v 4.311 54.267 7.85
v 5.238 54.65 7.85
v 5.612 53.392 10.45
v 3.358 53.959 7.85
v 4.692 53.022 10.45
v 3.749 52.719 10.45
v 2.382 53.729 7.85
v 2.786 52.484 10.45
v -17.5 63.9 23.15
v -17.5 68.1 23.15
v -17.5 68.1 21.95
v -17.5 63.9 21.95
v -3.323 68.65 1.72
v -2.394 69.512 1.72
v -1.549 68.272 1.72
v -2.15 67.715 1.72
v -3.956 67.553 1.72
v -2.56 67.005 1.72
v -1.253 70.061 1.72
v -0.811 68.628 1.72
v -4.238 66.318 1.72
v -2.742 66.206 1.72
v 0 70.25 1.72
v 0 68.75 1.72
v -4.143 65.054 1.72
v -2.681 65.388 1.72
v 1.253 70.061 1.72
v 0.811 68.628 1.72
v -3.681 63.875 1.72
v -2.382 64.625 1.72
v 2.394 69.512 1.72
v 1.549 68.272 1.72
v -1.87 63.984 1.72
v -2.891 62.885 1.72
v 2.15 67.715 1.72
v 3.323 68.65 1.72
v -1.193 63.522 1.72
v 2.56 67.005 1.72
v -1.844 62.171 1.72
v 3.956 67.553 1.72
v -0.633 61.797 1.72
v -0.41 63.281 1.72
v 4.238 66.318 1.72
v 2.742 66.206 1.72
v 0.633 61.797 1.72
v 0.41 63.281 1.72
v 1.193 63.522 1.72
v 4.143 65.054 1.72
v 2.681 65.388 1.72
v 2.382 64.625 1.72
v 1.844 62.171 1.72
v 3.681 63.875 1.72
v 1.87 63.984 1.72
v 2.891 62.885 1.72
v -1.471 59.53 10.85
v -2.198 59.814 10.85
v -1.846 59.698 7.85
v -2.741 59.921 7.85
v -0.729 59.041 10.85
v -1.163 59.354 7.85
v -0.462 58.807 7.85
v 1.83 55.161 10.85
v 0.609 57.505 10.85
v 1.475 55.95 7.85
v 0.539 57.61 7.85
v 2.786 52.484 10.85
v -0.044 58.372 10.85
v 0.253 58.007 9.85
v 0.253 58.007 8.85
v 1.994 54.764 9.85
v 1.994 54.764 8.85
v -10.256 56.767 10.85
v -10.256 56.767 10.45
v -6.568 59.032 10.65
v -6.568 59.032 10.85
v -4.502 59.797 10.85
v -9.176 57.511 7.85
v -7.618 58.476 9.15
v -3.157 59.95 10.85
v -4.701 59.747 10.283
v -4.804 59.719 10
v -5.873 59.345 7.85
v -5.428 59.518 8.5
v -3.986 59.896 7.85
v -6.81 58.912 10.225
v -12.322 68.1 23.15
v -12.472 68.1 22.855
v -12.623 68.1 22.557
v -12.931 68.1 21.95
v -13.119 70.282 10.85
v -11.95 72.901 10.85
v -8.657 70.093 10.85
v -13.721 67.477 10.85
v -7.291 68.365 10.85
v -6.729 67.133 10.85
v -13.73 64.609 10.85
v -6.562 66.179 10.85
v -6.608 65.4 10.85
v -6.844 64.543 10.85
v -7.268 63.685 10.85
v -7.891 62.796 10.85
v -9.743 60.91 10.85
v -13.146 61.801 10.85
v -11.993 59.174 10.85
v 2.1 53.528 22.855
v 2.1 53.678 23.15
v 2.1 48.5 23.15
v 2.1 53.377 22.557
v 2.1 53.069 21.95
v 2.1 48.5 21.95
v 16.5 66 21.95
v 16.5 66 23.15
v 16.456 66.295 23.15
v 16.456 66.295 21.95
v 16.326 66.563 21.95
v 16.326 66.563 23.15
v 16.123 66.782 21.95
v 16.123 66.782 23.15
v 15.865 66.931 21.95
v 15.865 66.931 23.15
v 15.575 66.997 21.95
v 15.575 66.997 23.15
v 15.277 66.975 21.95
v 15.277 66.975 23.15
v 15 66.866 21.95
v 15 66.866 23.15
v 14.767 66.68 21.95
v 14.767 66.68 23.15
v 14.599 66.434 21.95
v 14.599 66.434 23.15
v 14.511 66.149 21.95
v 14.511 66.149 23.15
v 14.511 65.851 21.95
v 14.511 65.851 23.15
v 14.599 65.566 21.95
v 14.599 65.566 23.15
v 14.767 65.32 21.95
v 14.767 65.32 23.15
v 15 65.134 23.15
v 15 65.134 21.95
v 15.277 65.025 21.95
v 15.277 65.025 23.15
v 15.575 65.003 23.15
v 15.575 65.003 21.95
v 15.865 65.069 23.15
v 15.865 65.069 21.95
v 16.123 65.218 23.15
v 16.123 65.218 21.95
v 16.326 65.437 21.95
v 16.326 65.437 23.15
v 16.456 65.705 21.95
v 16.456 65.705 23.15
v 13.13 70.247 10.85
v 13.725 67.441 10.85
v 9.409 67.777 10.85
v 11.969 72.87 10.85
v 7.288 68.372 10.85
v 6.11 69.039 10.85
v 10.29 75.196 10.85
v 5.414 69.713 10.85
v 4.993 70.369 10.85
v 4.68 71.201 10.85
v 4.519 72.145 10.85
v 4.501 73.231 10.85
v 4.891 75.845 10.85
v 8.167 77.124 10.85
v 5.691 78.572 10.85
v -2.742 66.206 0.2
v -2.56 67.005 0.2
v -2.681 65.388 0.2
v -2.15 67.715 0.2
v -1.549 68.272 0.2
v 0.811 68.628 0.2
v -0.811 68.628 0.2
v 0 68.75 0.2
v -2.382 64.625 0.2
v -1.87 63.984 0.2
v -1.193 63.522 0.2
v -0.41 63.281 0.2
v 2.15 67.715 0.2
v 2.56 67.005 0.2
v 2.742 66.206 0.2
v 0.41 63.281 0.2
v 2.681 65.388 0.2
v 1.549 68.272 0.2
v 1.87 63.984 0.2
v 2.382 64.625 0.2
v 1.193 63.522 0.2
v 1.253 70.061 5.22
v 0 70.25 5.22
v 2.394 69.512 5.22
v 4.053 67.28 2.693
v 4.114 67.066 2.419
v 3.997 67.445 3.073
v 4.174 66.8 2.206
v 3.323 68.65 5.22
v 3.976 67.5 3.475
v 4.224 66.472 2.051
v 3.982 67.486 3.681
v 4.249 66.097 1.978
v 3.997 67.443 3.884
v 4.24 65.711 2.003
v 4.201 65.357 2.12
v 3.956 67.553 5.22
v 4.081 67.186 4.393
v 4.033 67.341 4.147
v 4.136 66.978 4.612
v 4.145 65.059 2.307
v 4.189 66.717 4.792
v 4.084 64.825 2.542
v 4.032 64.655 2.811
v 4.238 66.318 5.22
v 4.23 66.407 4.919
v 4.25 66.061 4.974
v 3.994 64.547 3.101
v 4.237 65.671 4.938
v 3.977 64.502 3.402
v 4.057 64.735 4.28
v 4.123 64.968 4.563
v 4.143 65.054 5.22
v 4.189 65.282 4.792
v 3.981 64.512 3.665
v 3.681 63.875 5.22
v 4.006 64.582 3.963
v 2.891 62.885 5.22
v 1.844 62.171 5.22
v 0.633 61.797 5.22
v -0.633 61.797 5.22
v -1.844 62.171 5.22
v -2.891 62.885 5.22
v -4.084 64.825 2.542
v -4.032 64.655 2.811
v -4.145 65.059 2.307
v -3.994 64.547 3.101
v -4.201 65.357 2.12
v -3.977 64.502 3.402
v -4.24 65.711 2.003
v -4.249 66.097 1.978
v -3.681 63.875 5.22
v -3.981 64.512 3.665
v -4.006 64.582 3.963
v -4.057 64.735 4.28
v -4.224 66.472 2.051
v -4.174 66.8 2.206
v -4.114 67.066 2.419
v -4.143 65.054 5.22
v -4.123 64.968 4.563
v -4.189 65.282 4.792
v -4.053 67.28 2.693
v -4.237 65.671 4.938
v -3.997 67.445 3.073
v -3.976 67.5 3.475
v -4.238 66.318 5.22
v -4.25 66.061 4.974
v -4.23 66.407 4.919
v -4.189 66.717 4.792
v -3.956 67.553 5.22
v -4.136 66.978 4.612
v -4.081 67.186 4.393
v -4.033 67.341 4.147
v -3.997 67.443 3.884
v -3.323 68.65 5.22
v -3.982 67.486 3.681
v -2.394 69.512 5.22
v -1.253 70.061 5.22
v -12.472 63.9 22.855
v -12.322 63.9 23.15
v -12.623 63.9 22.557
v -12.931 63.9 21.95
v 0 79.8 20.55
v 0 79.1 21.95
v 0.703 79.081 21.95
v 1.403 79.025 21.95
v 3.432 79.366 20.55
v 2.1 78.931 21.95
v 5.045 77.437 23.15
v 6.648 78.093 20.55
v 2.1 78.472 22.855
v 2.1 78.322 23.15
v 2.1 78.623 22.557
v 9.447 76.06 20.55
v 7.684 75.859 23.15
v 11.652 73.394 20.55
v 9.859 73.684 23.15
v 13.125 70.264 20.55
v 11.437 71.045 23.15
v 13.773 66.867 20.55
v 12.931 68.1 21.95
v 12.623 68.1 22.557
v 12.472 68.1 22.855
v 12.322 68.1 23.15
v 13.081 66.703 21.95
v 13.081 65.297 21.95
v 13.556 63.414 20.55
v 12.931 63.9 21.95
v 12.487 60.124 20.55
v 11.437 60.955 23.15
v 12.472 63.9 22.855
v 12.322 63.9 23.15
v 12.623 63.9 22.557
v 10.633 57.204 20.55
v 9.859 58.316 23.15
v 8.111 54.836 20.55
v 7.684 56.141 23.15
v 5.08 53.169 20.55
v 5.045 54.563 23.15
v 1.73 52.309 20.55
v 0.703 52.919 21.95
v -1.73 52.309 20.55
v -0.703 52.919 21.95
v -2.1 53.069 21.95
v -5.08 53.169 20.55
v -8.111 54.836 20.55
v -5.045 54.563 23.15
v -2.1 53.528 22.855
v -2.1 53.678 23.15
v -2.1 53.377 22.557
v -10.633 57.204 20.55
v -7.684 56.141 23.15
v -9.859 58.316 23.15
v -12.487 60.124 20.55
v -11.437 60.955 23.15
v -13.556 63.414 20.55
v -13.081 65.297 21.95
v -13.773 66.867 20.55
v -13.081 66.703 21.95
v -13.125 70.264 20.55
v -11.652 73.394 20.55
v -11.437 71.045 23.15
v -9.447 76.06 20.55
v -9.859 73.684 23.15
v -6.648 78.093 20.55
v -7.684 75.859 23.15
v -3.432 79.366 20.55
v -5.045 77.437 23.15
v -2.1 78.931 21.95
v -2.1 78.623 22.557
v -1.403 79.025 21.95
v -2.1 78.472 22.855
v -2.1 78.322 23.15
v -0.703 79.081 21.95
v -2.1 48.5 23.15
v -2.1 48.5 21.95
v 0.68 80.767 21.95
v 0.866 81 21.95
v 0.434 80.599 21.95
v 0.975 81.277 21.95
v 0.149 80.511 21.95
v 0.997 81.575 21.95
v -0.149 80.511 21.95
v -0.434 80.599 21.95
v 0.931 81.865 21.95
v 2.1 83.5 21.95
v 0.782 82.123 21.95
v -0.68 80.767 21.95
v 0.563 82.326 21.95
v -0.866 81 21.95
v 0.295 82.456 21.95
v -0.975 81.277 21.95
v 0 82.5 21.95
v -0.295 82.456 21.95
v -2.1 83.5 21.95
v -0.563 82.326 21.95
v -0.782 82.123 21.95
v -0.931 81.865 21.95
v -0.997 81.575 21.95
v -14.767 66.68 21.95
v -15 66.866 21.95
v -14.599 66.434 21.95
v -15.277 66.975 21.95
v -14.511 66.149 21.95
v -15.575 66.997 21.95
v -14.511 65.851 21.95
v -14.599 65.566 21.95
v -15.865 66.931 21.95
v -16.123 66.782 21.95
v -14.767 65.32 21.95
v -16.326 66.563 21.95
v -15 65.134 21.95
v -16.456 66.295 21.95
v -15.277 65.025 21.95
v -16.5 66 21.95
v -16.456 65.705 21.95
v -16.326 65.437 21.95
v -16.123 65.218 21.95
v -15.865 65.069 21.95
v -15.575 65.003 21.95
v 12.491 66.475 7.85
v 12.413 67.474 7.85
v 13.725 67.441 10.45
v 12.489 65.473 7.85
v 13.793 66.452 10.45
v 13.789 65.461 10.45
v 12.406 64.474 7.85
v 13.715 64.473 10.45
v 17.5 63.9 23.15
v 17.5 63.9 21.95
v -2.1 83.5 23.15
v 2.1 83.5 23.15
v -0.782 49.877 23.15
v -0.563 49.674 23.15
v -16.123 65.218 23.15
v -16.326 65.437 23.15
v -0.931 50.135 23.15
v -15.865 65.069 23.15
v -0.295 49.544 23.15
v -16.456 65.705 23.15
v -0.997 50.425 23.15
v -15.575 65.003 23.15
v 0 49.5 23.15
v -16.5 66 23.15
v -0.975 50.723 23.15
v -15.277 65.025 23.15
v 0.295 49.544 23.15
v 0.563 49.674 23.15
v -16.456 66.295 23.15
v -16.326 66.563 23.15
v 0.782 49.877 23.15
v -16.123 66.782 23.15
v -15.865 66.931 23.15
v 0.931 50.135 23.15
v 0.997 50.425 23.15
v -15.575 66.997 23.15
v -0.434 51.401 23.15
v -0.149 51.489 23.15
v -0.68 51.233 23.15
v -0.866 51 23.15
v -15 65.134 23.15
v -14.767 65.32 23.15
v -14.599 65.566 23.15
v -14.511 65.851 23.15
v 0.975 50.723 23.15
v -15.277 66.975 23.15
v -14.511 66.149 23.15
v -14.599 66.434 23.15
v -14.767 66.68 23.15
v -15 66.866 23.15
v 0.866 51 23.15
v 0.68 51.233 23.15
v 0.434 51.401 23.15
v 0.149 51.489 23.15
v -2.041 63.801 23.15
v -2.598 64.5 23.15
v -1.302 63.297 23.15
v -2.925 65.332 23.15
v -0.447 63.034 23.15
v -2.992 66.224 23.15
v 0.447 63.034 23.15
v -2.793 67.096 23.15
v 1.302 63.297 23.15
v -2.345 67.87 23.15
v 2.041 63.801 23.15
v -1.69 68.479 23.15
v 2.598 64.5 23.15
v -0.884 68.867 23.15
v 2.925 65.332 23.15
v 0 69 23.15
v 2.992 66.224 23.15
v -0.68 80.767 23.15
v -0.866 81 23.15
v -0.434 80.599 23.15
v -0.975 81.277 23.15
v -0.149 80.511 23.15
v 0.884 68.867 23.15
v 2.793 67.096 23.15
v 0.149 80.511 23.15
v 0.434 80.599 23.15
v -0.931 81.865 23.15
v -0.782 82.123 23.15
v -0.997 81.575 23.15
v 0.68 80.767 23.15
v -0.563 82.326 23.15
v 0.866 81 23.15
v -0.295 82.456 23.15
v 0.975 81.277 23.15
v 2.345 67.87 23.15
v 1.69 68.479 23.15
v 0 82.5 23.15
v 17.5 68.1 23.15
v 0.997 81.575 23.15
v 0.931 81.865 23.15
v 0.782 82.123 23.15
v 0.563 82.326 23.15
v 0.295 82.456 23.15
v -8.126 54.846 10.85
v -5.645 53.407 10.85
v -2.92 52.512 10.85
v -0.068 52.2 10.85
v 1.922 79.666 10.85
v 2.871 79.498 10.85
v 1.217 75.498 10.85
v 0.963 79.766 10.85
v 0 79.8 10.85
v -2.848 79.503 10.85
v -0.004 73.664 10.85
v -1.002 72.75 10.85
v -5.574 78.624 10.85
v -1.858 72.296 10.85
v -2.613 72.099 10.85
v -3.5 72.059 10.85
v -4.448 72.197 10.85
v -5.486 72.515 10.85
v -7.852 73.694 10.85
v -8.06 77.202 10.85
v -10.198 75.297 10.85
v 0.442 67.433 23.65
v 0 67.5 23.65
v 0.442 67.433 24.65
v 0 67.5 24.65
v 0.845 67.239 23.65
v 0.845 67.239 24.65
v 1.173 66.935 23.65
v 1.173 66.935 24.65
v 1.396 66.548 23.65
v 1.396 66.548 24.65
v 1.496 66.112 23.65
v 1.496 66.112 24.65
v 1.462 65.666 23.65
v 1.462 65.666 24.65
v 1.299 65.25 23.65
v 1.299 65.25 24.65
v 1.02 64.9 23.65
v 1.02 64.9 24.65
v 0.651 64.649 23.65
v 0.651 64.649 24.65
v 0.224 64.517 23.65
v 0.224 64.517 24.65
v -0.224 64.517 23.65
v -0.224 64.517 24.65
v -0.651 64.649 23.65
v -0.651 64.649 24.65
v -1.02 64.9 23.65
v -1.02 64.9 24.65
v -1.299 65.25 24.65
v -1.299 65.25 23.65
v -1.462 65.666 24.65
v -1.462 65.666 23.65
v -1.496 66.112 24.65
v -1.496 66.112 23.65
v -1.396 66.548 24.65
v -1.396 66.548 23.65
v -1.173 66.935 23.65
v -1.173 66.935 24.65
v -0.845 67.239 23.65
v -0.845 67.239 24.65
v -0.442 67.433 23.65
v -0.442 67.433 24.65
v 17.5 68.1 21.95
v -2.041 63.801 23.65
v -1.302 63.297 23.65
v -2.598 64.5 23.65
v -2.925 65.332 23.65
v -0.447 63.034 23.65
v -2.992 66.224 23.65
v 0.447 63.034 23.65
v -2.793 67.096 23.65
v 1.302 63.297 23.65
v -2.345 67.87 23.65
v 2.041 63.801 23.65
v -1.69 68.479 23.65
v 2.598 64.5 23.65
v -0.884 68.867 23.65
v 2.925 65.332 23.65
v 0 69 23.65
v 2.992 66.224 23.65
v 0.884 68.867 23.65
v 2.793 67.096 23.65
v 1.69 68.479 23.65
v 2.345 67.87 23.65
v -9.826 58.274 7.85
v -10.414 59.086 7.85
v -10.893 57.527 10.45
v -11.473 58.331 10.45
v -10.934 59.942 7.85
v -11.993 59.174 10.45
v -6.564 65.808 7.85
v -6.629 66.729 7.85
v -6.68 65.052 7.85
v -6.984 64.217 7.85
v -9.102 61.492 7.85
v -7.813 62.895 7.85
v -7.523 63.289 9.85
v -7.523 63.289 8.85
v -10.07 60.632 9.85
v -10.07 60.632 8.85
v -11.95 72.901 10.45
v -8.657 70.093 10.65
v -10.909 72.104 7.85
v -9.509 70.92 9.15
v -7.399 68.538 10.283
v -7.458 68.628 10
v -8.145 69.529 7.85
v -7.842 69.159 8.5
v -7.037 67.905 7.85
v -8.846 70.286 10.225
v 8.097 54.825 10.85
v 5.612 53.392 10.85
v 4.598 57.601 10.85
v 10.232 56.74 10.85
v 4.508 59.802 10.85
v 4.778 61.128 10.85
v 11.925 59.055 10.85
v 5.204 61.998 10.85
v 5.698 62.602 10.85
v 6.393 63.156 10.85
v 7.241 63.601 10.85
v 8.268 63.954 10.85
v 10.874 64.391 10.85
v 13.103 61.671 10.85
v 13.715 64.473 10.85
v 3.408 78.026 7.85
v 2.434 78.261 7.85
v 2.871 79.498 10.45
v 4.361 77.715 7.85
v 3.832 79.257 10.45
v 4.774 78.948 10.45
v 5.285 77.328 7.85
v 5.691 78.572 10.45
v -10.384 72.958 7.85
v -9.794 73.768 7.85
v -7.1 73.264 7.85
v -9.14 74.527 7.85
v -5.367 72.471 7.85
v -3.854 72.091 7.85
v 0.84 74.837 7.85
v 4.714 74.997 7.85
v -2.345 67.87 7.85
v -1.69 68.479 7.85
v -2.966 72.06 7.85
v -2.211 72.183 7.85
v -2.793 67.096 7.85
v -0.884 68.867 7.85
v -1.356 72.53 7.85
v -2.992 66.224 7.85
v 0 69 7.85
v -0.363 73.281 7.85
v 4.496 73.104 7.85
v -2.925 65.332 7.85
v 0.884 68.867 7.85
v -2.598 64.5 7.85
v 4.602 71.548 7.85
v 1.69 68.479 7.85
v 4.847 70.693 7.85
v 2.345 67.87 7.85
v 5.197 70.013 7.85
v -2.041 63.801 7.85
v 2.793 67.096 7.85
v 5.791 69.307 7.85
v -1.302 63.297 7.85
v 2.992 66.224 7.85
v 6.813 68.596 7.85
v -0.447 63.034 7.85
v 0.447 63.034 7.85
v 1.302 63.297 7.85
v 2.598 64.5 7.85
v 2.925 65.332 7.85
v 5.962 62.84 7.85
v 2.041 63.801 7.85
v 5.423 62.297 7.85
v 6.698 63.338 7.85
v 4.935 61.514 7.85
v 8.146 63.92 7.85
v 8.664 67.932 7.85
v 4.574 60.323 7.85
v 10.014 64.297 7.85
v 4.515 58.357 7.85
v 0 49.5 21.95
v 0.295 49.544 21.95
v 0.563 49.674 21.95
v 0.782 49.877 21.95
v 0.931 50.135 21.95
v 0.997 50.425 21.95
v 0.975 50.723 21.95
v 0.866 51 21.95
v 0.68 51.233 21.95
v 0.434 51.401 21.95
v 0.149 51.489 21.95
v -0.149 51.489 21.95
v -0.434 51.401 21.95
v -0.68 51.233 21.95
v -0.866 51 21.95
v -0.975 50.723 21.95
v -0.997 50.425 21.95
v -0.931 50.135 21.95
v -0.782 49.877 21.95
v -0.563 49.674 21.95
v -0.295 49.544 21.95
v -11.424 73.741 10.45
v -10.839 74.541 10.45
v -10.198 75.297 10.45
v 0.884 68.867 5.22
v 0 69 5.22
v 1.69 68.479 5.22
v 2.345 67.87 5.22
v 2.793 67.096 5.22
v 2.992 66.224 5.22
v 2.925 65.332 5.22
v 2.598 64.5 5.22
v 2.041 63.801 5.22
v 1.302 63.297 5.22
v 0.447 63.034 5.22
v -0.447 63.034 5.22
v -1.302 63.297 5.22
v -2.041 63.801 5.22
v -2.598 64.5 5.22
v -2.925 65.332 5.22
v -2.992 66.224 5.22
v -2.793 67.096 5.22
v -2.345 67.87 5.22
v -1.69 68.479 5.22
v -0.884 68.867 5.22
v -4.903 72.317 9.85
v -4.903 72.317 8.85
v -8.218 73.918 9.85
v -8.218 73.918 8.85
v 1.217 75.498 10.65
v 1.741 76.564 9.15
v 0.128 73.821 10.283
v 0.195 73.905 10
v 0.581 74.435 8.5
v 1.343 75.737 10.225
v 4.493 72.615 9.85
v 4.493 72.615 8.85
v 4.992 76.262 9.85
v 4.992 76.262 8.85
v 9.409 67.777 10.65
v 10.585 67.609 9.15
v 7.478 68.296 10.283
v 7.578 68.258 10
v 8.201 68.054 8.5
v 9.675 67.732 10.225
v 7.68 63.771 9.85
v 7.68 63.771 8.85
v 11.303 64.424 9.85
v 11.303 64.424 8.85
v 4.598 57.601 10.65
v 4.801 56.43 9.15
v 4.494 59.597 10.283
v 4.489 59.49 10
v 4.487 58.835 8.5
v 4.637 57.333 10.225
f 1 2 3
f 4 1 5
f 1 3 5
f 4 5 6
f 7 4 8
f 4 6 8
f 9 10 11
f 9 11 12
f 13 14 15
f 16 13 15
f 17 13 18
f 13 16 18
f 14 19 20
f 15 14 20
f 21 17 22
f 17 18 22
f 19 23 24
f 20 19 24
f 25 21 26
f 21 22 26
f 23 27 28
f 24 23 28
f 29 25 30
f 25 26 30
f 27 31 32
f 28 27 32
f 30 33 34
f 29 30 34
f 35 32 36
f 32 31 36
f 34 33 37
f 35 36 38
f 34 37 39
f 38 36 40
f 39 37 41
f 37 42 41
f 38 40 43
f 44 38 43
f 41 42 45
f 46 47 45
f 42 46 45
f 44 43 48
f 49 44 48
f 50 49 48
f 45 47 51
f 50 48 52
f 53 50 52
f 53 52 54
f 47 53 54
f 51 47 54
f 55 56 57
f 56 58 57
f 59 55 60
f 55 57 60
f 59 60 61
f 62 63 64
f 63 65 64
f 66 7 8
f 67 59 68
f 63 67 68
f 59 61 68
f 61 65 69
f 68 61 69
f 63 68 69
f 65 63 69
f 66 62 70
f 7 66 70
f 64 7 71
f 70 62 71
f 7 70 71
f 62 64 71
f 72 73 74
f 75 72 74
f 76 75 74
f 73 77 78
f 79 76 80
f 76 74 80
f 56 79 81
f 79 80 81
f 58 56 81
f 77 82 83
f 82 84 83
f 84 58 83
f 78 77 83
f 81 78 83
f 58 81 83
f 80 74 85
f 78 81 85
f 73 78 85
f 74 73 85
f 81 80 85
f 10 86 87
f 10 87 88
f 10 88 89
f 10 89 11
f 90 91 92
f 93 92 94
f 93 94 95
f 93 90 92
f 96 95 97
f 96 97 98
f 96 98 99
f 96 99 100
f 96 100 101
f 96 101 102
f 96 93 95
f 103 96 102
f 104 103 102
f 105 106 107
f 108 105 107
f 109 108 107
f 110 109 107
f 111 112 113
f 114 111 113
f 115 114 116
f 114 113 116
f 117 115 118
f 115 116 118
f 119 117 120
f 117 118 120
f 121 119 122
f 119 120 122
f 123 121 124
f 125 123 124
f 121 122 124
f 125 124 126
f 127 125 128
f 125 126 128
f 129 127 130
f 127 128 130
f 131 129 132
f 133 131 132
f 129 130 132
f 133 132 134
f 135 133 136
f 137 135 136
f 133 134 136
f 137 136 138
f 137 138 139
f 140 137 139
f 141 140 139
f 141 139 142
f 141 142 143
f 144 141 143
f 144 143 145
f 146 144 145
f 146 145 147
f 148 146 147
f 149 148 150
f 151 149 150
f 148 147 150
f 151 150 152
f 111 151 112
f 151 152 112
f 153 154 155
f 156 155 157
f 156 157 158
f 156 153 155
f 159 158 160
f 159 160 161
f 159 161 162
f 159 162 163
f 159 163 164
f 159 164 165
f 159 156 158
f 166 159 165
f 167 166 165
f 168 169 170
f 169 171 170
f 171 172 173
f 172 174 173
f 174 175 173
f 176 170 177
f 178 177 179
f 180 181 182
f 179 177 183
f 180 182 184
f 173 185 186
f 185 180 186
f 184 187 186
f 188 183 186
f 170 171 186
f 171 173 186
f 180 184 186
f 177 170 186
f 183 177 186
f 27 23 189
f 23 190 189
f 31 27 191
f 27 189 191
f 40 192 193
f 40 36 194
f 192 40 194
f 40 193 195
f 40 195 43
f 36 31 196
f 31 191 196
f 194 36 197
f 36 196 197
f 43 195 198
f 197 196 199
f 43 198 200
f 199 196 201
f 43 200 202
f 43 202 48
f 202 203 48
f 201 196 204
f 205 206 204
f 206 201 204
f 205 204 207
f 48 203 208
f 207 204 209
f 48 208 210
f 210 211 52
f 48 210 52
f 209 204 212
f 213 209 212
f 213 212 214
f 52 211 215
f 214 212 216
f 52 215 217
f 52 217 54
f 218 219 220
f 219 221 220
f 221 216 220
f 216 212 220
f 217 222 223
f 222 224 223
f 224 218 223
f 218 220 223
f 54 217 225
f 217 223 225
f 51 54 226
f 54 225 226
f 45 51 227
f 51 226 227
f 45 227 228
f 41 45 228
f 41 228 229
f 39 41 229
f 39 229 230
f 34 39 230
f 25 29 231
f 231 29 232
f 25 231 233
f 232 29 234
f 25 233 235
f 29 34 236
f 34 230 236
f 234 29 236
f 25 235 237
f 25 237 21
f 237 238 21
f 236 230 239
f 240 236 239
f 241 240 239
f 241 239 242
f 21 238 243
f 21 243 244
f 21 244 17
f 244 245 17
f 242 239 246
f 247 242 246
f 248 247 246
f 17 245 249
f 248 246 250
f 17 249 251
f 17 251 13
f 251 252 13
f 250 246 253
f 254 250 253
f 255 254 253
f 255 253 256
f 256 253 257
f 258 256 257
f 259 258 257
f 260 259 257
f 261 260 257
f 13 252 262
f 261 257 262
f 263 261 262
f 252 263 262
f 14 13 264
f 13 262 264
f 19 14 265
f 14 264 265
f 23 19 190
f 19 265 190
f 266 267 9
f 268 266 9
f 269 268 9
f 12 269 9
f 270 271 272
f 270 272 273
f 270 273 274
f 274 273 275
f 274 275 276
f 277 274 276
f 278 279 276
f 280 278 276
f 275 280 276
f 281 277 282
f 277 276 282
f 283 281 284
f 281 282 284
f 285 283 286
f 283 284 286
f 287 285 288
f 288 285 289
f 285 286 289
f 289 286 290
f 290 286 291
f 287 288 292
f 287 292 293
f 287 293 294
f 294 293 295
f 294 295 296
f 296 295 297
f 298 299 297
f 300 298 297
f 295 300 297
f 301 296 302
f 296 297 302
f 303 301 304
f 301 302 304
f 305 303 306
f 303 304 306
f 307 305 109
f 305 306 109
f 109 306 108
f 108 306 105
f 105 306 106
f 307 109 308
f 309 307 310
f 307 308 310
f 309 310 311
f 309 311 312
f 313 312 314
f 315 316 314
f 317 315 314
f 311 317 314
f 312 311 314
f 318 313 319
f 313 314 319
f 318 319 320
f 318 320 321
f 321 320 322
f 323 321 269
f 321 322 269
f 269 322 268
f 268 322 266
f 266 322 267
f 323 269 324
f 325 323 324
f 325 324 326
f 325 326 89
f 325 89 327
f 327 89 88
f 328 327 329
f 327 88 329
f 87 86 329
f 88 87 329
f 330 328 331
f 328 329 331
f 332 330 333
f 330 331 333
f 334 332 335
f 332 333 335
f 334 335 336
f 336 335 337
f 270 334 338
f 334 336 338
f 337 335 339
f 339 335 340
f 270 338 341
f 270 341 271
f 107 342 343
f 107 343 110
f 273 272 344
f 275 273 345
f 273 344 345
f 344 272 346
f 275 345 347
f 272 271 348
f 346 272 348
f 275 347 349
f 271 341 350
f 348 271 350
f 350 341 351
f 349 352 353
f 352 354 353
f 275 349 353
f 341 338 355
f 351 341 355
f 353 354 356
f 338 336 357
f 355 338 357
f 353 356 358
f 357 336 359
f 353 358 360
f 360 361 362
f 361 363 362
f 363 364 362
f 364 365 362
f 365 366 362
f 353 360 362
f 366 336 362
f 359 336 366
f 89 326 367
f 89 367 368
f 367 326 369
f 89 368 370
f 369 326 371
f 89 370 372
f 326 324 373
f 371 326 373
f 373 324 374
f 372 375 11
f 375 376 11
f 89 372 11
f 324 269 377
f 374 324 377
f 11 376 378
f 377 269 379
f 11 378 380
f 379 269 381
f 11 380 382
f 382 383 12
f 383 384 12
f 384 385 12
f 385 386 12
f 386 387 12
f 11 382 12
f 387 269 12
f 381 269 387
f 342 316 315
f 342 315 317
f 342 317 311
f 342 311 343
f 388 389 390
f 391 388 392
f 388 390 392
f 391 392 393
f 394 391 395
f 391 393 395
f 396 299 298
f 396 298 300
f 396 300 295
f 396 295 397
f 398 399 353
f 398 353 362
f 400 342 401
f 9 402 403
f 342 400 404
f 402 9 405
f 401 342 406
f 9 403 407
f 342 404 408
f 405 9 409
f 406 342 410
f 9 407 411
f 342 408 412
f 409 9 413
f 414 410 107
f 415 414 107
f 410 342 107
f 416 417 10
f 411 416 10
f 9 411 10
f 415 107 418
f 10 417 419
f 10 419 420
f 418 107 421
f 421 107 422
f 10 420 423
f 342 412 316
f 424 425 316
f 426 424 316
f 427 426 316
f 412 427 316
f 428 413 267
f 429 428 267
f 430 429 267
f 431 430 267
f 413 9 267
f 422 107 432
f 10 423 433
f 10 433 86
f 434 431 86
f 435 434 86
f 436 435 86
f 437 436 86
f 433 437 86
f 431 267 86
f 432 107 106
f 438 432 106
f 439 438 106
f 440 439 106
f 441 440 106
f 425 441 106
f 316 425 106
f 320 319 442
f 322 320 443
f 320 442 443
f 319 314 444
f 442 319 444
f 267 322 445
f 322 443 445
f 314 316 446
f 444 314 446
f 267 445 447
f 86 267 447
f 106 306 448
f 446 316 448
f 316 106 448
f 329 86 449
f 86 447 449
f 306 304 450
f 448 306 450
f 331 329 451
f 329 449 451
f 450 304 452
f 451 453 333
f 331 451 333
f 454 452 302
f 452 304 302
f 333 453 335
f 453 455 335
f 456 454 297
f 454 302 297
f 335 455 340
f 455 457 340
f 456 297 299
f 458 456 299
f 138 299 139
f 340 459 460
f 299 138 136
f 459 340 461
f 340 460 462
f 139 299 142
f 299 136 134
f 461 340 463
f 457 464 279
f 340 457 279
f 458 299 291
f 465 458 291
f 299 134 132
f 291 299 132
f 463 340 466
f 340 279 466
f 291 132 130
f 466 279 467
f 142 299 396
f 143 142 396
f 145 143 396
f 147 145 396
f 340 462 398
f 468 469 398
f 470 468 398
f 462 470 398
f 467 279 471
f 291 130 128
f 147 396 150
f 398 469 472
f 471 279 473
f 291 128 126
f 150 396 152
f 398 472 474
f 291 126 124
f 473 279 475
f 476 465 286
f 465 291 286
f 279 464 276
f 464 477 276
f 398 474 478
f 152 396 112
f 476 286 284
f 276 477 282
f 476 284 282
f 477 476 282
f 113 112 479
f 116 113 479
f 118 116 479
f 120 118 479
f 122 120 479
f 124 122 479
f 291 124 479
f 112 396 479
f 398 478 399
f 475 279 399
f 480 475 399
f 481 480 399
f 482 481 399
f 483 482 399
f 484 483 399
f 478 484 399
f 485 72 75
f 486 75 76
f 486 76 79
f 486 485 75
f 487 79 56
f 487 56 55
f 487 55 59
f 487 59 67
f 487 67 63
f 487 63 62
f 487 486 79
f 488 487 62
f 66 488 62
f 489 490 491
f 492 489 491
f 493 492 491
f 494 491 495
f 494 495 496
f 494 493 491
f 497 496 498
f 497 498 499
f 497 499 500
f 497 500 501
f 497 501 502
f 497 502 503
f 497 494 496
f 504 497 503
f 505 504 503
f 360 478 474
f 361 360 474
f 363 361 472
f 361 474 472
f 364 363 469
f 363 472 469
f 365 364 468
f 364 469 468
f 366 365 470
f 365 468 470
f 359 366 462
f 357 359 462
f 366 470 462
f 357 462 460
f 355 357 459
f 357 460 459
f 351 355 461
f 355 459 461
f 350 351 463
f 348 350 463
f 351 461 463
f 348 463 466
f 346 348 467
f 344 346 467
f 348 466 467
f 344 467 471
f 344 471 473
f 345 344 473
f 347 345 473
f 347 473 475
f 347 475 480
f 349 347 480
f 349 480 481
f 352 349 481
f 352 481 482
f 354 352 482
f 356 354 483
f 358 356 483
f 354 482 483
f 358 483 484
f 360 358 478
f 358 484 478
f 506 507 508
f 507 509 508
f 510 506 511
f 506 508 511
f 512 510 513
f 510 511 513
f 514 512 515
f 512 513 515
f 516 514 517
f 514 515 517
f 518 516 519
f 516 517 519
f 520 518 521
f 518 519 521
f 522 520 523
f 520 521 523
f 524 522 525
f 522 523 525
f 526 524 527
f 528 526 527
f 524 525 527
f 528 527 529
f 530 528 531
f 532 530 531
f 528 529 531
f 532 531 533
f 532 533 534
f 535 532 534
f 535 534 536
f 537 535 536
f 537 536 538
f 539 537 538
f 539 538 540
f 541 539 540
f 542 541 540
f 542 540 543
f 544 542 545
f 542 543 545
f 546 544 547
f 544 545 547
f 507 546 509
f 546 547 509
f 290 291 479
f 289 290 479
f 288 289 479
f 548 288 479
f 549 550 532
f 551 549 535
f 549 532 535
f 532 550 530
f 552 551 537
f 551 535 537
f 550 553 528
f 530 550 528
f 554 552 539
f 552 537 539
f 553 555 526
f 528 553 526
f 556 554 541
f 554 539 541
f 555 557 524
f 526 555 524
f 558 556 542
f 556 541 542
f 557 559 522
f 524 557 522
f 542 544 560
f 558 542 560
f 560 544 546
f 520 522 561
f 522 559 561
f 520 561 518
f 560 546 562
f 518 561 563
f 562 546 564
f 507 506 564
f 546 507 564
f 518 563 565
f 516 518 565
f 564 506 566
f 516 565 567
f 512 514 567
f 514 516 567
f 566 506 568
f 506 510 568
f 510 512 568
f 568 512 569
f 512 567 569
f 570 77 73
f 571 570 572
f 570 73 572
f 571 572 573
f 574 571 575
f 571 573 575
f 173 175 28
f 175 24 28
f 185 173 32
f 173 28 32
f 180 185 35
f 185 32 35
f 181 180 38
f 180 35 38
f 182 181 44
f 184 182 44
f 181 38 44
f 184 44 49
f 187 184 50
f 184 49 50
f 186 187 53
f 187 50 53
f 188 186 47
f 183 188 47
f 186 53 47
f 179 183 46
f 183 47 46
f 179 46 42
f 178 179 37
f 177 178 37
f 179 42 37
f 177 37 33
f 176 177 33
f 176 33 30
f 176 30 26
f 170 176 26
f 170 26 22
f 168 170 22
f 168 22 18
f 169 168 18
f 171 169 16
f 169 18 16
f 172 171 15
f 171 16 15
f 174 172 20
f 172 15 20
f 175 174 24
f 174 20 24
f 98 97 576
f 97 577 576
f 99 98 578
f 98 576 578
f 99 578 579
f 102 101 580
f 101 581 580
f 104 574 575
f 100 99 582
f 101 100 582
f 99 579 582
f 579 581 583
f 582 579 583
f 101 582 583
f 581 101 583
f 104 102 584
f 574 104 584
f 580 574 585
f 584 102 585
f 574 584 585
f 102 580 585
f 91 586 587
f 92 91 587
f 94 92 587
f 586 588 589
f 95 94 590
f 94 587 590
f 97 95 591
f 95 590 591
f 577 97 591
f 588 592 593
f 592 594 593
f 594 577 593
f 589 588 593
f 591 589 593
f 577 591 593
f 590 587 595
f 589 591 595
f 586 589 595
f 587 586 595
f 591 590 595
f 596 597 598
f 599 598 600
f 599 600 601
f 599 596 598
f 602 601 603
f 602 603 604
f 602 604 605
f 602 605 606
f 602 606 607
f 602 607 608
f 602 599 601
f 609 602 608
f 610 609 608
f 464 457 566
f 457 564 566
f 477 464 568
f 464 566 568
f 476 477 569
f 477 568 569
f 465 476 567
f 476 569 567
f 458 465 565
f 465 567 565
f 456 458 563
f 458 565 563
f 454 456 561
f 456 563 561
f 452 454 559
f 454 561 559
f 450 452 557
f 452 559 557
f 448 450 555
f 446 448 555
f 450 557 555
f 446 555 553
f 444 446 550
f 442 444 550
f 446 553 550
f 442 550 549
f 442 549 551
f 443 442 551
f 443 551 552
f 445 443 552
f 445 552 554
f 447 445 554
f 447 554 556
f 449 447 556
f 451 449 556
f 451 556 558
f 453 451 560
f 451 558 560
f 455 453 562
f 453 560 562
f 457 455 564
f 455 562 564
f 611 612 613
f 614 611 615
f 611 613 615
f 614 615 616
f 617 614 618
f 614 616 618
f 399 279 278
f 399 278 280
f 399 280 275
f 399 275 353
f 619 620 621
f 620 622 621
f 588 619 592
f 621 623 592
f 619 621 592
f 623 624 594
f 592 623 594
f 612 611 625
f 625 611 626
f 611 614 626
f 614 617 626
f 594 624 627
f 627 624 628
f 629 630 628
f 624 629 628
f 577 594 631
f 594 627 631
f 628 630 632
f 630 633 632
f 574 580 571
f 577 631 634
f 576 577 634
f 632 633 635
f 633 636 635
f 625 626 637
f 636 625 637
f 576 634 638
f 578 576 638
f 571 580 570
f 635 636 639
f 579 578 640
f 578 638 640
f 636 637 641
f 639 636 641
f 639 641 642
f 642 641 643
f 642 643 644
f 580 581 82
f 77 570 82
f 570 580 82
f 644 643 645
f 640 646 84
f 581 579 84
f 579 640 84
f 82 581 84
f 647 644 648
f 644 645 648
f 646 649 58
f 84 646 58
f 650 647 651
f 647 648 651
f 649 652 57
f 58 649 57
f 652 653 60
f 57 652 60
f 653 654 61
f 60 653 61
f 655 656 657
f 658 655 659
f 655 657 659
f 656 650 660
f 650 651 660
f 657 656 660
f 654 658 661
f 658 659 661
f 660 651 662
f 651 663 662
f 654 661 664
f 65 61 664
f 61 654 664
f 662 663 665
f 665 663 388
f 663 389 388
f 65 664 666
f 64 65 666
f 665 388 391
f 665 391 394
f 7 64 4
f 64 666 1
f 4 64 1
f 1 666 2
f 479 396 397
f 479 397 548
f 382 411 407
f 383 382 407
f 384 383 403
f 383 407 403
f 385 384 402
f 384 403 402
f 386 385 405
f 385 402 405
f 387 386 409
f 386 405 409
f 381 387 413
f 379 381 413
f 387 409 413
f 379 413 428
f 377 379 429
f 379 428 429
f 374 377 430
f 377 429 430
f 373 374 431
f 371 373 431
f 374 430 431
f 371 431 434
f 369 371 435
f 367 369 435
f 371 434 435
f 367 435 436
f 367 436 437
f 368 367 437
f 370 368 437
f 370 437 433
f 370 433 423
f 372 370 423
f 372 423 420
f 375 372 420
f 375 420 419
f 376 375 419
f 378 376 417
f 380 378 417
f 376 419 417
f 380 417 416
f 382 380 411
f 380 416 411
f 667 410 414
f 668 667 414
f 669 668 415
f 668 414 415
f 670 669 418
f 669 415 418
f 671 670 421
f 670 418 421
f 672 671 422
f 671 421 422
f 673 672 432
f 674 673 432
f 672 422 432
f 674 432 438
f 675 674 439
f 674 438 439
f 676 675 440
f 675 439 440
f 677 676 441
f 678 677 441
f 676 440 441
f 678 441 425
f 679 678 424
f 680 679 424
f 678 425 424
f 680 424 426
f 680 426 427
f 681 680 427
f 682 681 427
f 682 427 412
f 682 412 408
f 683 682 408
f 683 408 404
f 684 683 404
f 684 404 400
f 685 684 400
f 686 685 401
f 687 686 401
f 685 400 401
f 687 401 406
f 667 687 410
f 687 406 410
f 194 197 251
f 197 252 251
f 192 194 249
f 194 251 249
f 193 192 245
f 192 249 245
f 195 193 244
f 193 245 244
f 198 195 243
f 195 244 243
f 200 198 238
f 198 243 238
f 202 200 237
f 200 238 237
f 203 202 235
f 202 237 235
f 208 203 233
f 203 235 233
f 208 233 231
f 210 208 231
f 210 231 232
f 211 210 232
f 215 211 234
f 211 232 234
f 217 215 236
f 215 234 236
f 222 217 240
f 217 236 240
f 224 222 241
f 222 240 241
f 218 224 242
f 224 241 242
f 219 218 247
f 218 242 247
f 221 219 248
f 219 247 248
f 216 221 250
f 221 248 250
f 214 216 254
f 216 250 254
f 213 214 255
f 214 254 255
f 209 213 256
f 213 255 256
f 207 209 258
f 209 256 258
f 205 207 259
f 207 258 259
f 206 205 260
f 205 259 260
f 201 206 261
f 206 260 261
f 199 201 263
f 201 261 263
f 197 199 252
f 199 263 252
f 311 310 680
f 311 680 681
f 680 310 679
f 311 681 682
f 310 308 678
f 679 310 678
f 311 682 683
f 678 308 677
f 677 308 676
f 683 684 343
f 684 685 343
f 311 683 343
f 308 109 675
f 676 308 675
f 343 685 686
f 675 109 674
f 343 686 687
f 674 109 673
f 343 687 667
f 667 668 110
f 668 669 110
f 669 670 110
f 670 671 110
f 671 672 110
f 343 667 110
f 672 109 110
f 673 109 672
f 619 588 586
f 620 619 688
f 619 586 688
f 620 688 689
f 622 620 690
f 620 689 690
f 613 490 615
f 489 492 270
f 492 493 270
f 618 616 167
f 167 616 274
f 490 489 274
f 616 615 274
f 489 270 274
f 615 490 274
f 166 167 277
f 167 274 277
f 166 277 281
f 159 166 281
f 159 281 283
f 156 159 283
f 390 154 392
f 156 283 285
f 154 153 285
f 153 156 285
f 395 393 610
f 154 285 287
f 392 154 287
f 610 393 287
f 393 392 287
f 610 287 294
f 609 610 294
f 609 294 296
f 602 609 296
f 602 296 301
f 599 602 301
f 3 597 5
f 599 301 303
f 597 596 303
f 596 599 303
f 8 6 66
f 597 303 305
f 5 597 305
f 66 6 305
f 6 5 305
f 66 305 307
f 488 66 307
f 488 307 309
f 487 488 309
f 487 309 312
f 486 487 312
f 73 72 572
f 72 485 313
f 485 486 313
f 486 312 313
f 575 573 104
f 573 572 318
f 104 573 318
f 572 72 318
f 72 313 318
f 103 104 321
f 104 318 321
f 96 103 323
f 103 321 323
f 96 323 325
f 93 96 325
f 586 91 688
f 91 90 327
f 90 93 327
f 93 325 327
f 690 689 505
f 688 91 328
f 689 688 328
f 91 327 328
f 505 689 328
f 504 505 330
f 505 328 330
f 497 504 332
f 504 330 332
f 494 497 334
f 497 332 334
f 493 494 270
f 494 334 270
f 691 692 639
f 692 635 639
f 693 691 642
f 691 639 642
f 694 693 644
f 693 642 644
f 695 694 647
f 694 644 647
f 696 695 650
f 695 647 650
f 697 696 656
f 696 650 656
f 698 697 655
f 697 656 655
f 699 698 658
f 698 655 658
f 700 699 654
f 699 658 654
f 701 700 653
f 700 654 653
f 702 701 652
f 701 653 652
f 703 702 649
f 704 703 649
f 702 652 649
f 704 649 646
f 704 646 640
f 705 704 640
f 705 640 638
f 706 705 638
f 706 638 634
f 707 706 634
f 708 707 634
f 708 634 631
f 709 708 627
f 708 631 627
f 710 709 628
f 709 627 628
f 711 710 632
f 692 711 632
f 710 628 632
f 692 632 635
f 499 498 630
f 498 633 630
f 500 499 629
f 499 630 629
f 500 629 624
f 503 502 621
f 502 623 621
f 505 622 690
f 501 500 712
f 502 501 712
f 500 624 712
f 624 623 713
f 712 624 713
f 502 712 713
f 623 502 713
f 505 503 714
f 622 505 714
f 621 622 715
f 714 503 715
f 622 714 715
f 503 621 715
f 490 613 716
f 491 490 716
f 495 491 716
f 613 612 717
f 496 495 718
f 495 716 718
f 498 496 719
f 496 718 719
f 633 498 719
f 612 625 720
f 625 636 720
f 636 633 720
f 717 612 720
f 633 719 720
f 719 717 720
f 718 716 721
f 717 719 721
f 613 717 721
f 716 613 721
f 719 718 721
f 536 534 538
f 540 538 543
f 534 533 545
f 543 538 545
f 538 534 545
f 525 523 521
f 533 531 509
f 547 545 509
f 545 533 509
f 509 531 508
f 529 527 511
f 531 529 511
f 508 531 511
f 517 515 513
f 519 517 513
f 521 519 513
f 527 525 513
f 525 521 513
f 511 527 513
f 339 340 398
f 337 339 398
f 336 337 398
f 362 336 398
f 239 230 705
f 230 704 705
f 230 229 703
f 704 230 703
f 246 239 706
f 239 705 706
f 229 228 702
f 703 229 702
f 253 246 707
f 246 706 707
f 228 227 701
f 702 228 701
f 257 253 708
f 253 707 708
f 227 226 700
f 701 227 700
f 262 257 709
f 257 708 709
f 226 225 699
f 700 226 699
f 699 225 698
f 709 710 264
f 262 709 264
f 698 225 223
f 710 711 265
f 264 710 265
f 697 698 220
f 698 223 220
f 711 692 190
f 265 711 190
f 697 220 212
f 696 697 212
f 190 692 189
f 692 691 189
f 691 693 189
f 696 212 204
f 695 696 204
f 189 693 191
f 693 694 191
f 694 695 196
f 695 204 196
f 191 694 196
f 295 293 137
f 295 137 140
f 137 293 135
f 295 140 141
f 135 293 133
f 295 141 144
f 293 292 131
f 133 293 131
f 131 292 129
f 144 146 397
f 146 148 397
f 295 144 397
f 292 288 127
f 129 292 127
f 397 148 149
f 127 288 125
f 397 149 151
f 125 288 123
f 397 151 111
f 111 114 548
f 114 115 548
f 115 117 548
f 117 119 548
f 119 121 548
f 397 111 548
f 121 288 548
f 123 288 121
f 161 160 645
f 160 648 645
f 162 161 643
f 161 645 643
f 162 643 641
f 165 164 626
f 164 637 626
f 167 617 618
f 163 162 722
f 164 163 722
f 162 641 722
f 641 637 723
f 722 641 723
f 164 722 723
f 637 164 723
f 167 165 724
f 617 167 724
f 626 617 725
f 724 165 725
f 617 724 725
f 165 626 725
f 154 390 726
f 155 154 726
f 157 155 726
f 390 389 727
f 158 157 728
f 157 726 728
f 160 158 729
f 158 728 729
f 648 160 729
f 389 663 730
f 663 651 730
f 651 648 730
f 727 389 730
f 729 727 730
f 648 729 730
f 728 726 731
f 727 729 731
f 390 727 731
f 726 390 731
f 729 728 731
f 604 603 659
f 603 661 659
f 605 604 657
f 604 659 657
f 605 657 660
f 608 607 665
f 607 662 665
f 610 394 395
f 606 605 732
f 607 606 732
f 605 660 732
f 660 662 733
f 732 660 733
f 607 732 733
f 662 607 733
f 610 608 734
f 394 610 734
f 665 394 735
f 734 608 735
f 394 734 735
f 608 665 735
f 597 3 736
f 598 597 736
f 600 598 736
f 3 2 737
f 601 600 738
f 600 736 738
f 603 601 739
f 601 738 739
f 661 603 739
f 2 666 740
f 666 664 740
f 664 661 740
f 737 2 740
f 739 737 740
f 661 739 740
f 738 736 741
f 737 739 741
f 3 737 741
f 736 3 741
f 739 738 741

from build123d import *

# Parameters (mm, degrees)
POCKET_DEPTH            = 3
POLARPATTERN001_COUNT   = 5
SKETCH007_R             = 1.5
POCKET001_DEPTH         = 5
POCKET001_DEPTH_BACK    = 100
SKETCH008_W             = 18.264466
SKETCH008_H             = 4.2
SKETCH008_R             = 1
PAD004_DEPTH            = 1.2
POLARPATTERN002_COUNT   = 4
BODY003_PLACEMENT_ANGLE = 180


with BuildPart() as part:
    # Sketch005 → Revolution (revolve)
    with BuildSketch(Plane.YZ):
        Polygon((0, 15.3), (2.75, 15.3), (2.75, 13.78), (4.25, 13.78), (4.25, 10.28), (3, 10.28), (3, 7.65), (12.5, 7.65), (13.8, 5.05), (13.8, -5.05), (12.5, -7.65), (3, -7.65), (3, -8.15), (1.5, -8.15), (1.5, -9.15), (0, -9.15), align=None)
    revolve(axis=Axis((0, 0, 0), (0, 0, 1)))

    # Sketch006 (on Face7 of Revolution) → Pocket (cut)
    with BuildSketch(Plane(origin=(0, 0, 7.65), x_dir=(0, -1, 0), z_dir=(0, 0, 1))):
        with BuildLine():
            add(Edge.make_bspline(
                [(-9.307214, 15.452806), (0, 1.064655), (9.307214, 15.452806), (-9.307214, 15.452806)],
                knots=[0, 0, 0, 0, 1, 1, 1, 1], degree=3, weights=[1, 11.84332, 40.102275, 1]))
        make_face()
    pocket = extrude(amount=-POCKET_DEPTH, mode=Mode.SUBTRACT)

    # PolarPattern001: Pocket ×5 about axis
    polarpattern001_axis = Axis((0, 0, 7.65), (0, 0, 1))
    for i in range(1, POLARPATTERN001_COUNT):
        add(pocket.rotate(polarpattern001_axis, i * 360 / POLARPATTERN001_COUNT), mode=Mode.SUBTRACT)

    # Sketch007 → Pocket001 (cut, two sides)
    with BuildSketch(Plane.YZ) as pocket001_sk:
        with Locations((0, 12.025208)):
            Circle(SKETCH007_R)
    extrude(amount=-POCKET001_DEPTH, mode=Mode.SUBTRACT)
    extrude(pocket001_sk.sketch, amount=POCKET001_DEPTH_BACK, mode=Mode.SUBTRACT)

    # Sketch008 (on Face26 of Pocket001) → Pad004 (join)
    with BuildSketch(Plane.YX.offset(7.65)):
        with Locations((8.367767, 0)):
            Rectangle(SKETCH008_W, SKETCH008_H)
        with Locations((15.5, 0)):
            Circle(SKETCH008_R, mode=Mode.SUBTRACT)
    pad004 = extrude(amount=-PAD004_DEPTH)

    # PolarPattern002: Pad004 ×4 about axis
    polarpattern002_axis = Axis((0, 0, -7.65), (0, 0, -1))
    for i in range(1, POLARPATTERN002_COUNT):
        add(pad004.rotate(polarpattern002_axis, i * 360 / POLARPATTERN002_COUNT))


with BuildPart() as part_1:
    # Body003 placement: moved
    add(part.part.moved(Location((0, 66, 15.5))).rotate(Axis((0, 66, 15.5), (0, 1, 0)), BODY003_PLACEMENT_ANGLE))


solid = part_1.part
